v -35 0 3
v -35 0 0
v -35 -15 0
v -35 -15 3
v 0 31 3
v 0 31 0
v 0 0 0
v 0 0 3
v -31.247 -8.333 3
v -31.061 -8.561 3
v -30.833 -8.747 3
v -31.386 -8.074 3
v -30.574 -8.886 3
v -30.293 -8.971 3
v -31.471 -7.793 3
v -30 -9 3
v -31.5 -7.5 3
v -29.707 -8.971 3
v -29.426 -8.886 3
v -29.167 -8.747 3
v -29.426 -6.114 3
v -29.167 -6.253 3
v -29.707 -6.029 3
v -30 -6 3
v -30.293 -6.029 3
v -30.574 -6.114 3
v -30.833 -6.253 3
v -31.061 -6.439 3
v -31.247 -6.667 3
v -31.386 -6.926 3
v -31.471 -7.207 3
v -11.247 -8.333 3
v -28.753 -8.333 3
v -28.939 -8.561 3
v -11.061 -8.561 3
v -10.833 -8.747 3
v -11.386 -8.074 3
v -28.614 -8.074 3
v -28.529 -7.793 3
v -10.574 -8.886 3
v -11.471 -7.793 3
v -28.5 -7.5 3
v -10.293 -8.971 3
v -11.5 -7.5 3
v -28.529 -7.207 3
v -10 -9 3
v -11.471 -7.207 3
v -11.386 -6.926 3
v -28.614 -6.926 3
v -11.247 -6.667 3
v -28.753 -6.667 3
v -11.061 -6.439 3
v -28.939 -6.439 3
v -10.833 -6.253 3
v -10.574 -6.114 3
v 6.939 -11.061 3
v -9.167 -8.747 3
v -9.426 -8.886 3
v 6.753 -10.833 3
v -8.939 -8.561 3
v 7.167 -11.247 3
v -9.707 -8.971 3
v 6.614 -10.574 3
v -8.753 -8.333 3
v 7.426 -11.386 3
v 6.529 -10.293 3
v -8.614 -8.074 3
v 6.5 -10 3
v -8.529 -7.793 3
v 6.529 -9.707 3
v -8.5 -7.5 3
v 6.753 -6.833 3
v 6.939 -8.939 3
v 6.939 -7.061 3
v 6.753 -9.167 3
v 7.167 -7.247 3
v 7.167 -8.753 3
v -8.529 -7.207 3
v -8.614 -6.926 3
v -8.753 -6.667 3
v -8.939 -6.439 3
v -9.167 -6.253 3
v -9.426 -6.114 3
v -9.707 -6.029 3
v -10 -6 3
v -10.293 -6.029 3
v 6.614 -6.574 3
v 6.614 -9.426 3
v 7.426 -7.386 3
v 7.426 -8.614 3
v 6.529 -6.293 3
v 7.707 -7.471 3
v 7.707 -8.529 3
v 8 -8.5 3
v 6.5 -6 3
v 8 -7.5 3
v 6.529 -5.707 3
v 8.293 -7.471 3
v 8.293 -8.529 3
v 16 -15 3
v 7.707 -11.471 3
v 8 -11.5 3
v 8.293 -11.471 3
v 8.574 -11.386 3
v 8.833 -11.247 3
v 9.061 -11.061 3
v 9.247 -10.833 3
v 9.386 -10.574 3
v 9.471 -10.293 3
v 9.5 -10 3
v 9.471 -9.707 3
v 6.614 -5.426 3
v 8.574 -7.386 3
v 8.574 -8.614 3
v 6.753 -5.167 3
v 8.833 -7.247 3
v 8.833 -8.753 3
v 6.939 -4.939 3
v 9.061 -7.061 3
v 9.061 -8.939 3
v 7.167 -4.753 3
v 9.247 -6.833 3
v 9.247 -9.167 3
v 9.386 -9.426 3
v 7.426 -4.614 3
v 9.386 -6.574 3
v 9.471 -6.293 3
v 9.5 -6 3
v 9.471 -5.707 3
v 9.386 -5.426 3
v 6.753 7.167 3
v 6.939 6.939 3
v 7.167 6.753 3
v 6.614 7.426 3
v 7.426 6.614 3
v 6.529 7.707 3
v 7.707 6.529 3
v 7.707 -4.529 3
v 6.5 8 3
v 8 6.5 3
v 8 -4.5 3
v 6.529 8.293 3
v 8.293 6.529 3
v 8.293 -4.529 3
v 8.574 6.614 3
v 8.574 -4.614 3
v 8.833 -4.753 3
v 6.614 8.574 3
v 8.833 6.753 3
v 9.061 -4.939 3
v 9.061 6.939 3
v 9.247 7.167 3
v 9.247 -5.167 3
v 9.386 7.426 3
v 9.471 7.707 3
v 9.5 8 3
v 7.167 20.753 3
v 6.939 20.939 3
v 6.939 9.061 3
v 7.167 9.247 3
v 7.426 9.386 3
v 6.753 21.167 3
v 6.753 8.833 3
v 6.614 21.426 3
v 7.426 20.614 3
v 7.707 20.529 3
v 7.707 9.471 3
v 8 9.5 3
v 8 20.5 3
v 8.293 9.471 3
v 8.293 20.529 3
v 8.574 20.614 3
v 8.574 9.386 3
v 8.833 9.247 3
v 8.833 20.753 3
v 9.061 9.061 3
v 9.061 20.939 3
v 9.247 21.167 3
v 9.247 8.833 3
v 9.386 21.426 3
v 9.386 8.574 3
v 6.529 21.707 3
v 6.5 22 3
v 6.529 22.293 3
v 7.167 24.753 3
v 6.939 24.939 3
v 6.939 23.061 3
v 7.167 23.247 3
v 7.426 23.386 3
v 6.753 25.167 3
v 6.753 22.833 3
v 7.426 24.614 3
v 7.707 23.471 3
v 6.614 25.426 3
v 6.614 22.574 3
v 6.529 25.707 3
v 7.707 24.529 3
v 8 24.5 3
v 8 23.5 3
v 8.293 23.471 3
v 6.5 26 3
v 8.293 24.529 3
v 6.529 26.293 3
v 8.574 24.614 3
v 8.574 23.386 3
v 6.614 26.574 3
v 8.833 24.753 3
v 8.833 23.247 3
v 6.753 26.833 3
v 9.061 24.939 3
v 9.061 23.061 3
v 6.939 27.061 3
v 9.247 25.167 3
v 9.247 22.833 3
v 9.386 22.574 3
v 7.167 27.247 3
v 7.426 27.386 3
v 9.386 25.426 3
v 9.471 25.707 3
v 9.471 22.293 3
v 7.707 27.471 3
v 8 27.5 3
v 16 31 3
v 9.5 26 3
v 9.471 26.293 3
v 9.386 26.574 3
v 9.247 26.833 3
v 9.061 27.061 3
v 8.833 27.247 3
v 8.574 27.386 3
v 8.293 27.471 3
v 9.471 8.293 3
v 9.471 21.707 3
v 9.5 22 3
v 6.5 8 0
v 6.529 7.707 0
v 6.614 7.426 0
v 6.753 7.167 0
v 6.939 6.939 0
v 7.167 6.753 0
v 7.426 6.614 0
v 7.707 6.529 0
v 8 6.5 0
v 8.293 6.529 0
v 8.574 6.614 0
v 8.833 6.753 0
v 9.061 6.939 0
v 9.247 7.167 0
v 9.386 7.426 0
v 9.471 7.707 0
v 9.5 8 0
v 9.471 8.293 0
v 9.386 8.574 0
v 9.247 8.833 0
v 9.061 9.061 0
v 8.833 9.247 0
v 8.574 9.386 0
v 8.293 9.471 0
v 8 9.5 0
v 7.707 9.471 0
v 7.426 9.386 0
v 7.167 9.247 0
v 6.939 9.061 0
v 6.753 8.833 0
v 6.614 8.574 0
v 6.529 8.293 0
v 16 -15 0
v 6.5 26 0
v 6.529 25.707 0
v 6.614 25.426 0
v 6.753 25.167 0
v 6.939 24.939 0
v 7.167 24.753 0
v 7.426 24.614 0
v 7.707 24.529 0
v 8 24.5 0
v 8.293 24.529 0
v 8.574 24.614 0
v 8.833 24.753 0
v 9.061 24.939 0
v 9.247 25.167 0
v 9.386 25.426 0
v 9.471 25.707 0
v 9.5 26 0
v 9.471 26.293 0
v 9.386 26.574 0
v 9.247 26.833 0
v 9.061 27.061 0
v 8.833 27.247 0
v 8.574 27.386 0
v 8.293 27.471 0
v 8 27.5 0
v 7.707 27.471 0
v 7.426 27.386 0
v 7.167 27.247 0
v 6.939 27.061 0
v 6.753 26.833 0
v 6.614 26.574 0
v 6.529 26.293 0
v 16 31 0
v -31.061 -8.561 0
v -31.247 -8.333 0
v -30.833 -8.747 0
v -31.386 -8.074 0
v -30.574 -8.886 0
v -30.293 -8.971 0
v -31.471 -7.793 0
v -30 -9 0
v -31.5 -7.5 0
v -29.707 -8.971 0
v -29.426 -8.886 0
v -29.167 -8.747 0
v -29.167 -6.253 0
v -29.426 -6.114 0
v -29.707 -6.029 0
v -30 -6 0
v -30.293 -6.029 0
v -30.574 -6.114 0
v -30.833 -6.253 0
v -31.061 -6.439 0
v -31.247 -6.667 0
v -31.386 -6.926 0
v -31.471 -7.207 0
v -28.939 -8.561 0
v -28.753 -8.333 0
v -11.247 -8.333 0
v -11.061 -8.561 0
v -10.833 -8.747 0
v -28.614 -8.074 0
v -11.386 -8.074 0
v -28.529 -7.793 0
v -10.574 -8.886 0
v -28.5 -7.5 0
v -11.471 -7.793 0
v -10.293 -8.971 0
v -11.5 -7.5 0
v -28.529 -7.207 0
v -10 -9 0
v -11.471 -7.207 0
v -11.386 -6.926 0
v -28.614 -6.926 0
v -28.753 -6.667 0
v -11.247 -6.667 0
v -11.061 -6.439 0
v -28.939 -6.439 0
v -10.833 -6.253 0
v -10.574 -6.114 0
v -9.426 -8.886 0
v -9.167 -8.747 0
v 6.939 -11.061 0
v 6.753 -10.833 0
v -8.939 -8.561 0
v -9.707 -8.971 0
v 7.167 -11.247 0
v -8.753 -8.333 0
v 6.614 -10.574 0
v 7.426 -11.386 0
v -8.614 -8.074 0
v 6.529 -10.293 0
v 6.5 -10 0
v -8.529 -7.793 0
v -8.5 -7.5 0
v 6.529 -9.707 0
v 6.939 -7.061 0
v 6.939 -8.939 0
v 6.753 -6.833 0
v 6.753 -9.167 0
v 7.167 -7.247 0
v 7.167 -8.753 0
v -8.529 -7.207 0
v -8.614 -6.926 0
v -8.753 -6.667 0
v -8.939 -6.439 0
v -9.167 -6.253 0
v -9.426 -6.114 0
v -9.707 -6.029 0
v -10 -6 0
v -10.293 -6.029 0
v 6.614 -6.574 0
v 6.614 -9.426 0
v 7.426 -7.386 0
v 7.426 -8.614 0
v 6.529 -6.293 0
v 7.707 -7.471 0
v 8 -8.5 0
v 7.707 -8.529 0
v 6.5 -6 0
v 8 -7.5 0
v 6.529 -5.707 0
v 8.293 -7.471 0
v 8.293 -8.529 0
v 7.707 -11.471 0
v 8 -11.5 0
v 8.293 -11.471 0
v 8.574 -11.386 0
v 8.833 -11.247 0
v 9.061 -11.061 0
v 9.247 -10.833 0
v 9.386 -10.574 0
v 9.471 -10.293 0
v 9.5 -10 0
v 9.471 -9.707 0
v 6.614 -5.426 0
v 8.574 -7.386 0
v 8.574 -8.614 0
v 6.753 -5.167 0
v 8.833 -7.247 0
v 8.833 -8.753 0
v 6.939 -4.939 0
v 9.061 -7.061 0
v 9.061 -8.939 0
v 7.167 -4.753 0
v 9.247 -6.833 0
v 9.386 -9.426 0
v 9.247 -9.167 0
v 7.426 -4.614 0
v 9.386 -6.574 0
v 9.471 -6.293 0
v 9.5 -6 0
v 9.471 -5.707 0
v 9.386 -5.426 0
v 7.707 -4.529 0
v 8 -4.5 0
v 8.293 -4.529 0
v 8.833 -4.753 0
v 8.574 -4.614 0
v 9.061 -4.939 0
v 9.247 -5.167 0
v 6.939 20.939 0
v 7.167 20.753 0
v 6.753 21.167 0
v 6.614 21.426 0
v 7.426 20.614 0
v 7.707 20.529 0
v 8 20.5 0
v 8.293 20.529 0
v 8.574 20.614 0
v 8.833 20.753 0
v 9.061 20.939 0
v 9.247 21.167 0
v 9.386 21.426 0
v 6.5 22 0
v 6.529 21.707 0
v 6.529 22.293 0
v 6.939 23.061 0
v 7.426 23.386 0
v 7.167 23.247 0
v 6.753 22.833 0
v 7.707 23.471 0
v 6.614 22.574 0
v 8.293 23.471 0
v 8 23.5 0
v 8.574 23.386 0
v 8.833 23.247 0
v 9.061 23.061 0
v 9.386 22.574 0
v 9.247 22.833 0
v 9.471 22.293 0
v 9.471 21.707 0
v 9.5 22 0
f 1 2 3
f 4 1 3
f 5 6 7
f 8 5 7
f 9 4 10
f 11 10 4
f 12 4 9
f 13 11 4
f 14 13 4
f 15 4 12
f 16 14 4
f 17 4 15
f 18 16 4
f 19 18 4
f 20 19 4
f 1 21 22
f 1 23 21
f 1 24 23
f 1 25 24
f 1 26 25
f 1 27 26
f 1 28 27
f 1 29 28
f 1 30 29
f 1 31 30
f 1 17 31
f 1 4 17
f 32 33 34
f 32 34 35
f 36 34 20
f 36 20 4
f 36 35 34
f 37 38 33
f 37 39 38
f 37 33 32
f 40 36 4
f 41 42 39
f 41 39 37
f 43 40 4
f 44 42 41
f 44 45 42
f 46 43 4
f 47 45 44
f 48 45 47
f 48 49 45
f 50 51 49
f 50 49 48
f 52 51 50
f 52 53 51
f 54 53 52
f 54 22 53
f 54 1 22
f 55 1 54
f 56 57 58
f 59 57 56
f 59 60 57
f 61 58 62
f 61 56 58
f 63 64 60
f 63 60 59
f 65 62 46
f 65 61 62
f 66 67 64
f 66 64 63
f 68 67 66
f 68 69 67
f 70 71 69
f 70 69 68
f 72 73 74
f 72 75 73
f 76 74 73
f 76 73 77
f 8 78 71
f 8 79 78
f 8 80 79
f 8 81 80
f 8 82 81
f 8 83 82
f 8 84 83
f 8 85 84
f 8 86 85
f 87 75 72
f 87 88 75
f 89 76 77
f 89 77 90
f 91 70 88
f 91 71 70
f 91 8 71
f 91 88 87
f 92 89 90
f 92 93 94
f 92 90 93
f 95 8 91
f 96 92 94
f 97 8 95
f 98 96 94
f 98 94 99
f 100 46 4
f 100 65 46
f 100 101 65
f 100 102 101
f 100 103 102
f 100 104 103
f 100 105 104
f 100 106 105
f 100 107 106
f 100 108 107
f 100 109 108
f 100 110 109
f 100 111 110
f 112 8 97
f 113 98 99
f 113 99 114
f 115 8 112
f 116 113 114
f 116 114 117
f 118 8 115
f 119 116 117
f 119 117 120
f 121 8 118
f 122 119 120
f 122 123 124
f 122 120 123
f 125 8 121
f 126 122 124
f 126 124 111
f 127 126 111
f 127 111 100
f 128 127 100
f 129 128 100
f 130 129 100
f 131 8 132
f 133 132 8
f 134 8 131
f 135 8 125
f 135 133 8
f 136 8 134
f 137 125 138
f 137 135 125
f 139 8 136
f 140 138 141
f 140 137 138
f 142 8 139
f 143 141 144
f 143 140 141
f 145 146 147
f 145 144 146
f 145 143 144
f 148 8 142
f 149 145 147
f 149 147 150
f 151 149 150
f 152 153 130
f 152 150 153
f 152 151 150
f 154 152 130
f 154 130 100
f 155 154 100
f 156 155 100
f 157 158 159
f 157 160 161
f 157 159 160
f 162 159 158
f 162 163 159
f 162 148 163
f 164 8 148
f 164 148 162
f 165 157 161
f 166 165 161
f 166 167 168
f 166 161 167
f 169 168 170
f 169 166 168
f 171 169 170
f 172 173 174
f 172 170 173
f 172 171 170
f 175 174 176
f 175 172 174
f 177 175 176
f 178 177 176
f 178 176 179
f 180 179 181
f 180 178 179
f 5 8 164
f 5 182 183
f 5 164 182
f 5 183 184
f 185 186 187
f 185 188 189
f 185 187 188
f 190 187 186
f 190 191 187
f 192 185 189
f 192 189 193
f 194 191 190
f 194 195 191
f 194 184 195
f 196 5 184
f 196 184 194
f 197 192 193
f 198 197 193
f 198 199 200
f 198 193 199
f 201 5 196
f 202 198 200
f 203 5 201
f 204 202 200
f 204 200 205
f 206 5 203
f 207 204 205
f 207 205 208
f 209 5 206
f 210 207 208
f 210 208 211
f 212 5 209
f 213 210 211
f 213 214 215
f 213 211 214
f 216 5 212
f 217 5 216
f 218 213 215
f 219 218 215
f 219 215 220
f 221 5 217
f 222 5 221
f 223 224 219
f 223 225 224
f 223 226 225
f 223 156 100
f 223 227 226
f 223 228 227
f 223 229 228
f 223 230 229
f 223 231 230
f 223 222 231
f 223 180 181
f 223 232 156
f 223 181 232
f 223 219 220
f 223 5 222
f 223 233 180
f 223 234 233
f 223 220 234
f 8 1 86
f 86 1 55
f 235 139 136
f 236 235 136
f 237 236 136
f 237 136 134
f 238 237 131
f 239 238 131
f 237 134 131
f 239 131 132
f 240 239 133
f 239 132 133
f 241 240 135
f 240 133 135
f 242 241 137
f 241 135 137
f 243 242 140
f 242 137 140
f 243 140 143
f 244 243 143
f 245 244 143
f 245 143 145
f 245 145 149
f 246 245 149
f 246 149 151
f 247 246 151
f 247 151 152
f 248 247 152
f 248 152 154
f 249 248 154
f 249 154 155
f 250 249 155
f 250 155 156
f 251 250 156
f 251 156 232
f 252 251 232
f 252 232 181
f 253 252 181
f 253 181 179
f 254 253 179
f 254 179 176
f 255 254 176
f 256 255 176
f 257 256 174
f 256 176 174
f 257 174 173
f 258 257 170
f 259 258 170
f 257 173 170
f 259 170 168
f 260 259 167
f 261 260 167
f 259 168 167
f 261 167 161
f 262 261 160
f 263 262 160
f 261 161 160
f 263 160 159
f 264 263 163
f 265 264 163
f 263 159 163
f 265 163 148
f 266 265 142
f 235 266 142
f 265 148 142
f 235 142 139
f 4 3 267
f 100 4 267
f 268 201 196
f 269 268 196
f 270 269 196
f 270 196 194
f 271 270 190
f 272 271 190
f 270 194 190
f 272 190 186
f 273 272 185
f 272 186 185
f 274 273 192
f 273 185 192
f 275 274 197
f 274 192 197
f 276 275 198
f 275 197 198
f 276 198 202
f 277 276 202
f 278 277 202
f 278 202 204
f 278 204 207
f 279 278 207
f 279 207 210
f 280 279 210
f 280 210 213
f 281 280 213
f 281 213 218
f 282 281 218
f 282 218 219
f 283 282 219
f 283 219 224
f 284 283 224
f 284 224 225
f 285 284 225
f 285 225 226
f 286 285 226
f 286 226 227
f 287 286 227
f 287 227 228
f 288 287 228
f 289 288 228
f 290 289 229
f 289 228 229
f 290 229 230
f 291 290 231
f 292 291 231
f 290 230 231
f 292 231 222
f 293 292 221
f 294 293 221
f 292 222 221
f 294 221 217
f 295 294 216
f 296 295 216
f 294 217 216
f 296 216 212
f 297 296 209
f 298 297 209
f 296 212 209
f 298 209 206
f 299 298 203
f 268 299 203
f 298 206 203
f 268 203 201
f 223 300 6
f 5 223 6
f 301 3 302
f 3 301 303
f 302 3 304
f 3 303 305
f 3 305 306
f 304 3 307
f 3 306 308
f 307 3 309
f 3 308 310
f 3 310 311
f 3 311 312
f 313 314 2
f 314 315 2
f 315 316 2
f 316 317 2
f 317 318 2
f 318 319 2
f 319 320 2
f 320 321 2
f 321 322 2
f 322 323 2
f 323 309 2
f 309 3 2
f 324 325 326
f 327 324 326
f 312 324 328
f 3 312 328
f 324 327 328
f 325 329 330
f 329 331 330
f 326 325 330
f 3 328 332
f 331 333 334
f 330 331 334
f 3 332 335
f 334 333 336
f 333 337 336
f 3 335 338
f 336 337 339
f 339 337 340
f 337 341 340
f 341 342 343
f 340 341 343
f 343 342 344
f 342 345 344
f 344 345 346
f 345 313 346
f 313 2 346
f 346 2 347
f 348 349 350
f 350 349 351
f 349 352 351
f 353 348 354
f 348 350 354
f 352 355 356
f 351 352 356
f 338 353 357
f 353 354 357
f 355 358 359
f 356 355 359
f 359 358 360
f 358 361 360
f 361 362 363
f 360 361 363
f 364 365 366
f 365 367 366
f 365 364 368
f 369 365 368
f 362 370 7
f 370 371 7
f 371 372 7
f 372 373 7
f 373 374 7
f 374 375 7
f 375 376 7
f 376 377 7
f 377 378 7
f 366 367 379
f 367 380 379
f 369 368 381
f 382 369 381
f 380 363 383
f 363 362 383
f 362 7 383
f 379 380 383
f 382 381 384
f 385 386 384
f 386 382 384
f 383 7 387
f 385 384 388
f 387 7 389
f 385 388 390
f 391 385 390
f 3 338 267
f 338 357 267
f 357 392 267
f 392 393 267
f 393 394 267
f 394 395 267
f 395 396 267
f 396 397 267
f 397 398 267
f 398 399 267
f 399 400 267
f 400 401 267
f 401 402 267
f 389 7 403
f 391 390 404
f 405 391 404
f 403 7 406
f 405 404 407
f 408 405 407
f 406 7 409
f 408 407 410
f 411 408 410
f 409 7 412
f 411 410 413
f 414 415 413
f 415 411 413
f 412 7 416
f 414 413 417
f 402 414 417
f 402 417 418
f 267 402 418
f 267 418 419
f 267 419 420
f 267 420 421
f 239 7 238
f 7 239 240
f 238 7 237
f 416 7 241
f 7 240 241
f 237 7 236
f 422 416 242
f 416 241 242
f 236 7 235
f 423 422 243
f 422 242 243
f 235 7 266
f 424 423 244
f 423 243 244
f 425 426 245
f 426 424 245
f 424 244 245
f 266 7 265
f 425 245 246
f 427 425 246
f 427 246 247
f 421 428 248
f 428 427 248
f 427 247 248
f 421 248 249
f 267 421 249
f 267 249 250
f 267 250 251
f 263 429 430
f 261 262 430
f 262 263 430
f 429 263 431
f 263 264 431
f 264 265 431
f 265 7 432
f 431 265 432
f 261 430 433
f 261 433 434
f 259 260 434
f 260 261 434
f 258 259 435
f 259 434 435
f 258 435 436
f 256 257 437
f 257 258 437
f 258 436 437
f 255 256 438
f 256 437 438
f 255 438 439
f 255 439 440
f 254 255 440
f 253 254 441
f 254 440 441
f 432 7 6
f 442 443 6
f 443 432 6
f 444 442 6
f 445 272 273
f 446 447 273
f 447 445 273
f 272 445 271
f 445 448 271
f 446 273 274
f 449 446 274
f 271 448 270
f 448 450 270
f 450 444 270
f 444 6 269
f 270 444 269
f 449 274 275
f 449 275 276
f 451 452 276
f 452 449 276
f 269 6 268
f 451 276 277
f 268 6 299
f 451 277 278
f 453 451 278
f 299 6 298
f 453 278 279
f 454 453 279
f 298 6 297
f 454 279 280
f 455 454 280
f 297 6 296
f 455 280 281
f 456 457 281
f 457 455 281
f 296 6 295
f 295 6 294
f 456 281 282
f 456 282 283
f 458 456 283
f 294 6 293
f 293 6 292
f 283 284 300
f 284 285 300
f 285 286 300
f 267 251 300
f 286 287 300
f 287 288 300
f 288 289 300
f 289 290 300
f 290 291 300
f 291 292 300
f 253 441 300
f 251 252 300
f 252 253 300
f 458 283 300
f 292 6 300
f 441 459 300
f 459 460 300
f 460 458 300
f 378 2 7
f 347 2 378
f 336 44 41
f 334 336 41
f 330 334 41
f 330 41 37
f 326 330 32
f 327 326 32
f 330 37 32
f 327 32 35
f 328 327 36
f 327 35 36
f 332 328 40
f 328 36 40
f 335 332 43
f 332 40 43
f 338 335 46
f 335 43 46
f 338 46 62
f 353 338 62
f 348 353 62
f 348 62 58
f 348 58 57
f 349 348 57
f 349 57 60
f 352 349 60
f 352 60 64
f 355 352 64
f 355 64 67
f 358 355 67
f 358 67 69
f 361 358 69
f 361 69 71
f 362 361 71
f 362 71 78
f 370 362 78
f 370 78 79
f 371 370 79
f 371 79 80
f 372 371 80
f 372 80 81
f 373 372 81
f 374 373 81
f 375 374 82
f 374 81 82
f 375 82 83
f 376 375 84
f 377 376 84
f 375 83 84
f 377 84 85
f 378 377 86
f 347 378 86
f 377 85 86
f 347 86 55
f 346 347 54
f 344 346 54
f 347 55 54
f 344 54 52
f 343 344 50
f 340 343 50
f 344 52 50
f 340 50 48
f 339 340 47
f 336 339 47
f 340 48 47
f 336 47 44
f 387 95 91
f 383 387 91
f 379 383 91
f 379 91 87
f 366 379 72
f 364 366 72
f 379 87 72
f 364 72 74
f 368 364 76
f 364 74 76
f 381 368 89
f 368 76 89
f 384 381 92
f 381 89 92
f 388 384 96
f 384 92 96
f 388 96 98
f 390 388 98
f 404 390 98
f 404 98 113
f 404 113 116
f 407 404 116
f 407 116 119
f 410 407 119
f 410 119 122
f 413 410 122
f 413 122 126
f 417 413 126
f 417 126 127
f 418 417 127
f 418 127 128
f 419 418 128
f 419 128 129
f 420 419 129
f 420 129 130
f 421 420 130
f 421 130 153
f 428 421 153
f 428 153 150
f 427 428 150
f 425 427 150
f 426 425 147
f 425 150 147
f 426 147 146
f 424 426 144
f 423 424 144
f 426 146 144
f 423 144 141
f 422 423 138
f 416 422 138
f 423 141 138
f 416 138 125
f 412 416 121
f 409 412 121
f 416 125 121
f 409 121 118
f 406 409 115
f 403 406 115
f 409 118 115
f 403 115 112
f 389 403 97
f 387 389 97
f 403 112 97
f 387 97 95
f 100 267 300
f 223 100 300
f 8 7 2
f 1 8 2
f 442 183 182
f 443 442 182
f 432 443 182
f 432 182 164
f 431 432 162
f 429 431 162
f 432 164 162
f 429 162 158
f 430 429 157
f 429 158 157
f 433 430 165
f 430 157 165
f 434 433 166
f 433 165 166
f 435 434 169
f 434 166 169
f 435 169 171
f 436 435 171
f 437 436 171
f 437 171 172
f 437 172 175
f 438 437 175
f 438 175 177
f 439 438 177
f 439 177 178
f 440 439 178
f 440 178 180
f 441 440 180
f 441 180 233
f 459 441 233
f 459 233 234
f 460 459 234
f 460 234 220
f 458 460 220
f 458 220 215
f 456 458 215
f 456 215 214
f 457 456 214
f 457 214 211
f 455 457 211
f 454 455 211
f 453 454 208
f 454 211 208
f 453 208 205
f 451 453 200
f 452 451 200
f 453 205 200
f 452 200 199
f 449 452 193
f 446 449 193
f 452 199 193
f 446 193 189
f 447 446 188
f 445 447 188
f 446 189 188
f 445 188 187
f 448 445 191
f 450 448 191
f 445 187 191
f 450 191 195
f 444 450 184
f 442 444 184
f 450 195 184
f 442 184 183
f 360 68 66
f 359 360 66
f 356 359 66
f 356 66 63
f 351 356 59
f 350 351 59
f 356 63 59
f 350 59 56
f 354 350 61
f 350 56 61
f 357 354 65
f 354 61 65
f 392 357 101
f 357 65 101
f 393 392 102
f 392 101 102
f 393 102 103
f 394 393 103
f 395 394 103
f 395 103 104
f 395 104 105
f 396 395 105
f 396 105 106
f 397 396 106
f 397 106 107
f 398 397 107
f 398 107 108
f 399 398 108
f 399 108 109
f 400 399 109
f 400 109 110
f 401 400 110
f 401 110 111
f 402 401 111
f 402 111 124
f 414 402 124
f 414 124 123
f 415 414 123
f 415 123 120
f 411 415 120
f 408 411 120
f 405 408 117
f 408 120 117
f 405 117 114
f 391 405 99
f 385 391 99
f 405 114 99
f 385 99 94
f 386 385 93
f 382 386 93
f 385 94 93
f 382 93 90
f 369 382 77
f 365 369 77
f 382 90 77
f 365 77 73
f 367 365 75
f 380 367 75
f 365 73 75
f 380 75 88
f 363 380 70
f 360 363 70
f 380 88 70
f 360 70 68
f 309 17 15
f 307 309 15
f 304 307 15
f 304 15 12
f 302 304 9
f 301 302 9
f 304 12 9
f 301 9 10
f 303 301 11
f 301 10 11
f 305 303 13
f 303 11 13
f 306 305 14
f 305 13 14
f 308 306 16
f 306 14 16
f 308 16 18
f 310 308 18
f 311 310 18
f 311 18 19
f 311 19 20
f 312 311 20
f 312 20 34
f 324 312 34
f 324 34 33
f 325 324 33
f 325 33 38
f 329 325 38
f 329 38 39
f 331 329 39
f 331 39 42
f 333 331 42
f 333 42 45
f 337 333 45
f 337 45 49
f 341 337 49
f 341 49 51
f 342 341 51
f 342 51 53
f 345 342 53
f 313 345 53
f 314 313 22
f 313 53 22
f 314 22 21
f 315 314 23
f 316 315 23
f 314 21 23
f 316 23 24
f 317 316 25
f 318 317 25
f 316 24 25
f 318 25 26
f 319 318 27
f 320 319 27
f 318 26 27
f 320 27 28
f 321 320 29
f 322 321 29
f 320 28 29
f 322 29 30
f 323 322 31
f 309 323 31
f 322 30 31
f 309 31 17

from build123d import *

# Parameters (mm, degrees)
F1_DEPTH = 3
F2_D     = 3


# Not quite as in the source:
# - a feature names something its author has since deleted; it is built from what else it names


with BuildPart() as f1:
    # F0 (on Top) → F1 (new body)
    with BuildSketch(Plane.XY):
        Polygon((0, 31), (0, 0), (-35, 0), (-35, -15), (0, -15), (16, -15), (16, 31), align=None)
    extrude(amount=F1_DEPTH)

    # F2 (through all)
    with Locations(Plane(origin=(0, 0, 0), x_dir=(1, 0, 0), z_dir=(0, 0, -1))):
        with Locations((8, -8), (8, -22), (-10, 7.5), (-30, 7.5), (8, 6), (8, -26), (8, 10)):
            Hole(F2_D / 2)


solid = f1.part
